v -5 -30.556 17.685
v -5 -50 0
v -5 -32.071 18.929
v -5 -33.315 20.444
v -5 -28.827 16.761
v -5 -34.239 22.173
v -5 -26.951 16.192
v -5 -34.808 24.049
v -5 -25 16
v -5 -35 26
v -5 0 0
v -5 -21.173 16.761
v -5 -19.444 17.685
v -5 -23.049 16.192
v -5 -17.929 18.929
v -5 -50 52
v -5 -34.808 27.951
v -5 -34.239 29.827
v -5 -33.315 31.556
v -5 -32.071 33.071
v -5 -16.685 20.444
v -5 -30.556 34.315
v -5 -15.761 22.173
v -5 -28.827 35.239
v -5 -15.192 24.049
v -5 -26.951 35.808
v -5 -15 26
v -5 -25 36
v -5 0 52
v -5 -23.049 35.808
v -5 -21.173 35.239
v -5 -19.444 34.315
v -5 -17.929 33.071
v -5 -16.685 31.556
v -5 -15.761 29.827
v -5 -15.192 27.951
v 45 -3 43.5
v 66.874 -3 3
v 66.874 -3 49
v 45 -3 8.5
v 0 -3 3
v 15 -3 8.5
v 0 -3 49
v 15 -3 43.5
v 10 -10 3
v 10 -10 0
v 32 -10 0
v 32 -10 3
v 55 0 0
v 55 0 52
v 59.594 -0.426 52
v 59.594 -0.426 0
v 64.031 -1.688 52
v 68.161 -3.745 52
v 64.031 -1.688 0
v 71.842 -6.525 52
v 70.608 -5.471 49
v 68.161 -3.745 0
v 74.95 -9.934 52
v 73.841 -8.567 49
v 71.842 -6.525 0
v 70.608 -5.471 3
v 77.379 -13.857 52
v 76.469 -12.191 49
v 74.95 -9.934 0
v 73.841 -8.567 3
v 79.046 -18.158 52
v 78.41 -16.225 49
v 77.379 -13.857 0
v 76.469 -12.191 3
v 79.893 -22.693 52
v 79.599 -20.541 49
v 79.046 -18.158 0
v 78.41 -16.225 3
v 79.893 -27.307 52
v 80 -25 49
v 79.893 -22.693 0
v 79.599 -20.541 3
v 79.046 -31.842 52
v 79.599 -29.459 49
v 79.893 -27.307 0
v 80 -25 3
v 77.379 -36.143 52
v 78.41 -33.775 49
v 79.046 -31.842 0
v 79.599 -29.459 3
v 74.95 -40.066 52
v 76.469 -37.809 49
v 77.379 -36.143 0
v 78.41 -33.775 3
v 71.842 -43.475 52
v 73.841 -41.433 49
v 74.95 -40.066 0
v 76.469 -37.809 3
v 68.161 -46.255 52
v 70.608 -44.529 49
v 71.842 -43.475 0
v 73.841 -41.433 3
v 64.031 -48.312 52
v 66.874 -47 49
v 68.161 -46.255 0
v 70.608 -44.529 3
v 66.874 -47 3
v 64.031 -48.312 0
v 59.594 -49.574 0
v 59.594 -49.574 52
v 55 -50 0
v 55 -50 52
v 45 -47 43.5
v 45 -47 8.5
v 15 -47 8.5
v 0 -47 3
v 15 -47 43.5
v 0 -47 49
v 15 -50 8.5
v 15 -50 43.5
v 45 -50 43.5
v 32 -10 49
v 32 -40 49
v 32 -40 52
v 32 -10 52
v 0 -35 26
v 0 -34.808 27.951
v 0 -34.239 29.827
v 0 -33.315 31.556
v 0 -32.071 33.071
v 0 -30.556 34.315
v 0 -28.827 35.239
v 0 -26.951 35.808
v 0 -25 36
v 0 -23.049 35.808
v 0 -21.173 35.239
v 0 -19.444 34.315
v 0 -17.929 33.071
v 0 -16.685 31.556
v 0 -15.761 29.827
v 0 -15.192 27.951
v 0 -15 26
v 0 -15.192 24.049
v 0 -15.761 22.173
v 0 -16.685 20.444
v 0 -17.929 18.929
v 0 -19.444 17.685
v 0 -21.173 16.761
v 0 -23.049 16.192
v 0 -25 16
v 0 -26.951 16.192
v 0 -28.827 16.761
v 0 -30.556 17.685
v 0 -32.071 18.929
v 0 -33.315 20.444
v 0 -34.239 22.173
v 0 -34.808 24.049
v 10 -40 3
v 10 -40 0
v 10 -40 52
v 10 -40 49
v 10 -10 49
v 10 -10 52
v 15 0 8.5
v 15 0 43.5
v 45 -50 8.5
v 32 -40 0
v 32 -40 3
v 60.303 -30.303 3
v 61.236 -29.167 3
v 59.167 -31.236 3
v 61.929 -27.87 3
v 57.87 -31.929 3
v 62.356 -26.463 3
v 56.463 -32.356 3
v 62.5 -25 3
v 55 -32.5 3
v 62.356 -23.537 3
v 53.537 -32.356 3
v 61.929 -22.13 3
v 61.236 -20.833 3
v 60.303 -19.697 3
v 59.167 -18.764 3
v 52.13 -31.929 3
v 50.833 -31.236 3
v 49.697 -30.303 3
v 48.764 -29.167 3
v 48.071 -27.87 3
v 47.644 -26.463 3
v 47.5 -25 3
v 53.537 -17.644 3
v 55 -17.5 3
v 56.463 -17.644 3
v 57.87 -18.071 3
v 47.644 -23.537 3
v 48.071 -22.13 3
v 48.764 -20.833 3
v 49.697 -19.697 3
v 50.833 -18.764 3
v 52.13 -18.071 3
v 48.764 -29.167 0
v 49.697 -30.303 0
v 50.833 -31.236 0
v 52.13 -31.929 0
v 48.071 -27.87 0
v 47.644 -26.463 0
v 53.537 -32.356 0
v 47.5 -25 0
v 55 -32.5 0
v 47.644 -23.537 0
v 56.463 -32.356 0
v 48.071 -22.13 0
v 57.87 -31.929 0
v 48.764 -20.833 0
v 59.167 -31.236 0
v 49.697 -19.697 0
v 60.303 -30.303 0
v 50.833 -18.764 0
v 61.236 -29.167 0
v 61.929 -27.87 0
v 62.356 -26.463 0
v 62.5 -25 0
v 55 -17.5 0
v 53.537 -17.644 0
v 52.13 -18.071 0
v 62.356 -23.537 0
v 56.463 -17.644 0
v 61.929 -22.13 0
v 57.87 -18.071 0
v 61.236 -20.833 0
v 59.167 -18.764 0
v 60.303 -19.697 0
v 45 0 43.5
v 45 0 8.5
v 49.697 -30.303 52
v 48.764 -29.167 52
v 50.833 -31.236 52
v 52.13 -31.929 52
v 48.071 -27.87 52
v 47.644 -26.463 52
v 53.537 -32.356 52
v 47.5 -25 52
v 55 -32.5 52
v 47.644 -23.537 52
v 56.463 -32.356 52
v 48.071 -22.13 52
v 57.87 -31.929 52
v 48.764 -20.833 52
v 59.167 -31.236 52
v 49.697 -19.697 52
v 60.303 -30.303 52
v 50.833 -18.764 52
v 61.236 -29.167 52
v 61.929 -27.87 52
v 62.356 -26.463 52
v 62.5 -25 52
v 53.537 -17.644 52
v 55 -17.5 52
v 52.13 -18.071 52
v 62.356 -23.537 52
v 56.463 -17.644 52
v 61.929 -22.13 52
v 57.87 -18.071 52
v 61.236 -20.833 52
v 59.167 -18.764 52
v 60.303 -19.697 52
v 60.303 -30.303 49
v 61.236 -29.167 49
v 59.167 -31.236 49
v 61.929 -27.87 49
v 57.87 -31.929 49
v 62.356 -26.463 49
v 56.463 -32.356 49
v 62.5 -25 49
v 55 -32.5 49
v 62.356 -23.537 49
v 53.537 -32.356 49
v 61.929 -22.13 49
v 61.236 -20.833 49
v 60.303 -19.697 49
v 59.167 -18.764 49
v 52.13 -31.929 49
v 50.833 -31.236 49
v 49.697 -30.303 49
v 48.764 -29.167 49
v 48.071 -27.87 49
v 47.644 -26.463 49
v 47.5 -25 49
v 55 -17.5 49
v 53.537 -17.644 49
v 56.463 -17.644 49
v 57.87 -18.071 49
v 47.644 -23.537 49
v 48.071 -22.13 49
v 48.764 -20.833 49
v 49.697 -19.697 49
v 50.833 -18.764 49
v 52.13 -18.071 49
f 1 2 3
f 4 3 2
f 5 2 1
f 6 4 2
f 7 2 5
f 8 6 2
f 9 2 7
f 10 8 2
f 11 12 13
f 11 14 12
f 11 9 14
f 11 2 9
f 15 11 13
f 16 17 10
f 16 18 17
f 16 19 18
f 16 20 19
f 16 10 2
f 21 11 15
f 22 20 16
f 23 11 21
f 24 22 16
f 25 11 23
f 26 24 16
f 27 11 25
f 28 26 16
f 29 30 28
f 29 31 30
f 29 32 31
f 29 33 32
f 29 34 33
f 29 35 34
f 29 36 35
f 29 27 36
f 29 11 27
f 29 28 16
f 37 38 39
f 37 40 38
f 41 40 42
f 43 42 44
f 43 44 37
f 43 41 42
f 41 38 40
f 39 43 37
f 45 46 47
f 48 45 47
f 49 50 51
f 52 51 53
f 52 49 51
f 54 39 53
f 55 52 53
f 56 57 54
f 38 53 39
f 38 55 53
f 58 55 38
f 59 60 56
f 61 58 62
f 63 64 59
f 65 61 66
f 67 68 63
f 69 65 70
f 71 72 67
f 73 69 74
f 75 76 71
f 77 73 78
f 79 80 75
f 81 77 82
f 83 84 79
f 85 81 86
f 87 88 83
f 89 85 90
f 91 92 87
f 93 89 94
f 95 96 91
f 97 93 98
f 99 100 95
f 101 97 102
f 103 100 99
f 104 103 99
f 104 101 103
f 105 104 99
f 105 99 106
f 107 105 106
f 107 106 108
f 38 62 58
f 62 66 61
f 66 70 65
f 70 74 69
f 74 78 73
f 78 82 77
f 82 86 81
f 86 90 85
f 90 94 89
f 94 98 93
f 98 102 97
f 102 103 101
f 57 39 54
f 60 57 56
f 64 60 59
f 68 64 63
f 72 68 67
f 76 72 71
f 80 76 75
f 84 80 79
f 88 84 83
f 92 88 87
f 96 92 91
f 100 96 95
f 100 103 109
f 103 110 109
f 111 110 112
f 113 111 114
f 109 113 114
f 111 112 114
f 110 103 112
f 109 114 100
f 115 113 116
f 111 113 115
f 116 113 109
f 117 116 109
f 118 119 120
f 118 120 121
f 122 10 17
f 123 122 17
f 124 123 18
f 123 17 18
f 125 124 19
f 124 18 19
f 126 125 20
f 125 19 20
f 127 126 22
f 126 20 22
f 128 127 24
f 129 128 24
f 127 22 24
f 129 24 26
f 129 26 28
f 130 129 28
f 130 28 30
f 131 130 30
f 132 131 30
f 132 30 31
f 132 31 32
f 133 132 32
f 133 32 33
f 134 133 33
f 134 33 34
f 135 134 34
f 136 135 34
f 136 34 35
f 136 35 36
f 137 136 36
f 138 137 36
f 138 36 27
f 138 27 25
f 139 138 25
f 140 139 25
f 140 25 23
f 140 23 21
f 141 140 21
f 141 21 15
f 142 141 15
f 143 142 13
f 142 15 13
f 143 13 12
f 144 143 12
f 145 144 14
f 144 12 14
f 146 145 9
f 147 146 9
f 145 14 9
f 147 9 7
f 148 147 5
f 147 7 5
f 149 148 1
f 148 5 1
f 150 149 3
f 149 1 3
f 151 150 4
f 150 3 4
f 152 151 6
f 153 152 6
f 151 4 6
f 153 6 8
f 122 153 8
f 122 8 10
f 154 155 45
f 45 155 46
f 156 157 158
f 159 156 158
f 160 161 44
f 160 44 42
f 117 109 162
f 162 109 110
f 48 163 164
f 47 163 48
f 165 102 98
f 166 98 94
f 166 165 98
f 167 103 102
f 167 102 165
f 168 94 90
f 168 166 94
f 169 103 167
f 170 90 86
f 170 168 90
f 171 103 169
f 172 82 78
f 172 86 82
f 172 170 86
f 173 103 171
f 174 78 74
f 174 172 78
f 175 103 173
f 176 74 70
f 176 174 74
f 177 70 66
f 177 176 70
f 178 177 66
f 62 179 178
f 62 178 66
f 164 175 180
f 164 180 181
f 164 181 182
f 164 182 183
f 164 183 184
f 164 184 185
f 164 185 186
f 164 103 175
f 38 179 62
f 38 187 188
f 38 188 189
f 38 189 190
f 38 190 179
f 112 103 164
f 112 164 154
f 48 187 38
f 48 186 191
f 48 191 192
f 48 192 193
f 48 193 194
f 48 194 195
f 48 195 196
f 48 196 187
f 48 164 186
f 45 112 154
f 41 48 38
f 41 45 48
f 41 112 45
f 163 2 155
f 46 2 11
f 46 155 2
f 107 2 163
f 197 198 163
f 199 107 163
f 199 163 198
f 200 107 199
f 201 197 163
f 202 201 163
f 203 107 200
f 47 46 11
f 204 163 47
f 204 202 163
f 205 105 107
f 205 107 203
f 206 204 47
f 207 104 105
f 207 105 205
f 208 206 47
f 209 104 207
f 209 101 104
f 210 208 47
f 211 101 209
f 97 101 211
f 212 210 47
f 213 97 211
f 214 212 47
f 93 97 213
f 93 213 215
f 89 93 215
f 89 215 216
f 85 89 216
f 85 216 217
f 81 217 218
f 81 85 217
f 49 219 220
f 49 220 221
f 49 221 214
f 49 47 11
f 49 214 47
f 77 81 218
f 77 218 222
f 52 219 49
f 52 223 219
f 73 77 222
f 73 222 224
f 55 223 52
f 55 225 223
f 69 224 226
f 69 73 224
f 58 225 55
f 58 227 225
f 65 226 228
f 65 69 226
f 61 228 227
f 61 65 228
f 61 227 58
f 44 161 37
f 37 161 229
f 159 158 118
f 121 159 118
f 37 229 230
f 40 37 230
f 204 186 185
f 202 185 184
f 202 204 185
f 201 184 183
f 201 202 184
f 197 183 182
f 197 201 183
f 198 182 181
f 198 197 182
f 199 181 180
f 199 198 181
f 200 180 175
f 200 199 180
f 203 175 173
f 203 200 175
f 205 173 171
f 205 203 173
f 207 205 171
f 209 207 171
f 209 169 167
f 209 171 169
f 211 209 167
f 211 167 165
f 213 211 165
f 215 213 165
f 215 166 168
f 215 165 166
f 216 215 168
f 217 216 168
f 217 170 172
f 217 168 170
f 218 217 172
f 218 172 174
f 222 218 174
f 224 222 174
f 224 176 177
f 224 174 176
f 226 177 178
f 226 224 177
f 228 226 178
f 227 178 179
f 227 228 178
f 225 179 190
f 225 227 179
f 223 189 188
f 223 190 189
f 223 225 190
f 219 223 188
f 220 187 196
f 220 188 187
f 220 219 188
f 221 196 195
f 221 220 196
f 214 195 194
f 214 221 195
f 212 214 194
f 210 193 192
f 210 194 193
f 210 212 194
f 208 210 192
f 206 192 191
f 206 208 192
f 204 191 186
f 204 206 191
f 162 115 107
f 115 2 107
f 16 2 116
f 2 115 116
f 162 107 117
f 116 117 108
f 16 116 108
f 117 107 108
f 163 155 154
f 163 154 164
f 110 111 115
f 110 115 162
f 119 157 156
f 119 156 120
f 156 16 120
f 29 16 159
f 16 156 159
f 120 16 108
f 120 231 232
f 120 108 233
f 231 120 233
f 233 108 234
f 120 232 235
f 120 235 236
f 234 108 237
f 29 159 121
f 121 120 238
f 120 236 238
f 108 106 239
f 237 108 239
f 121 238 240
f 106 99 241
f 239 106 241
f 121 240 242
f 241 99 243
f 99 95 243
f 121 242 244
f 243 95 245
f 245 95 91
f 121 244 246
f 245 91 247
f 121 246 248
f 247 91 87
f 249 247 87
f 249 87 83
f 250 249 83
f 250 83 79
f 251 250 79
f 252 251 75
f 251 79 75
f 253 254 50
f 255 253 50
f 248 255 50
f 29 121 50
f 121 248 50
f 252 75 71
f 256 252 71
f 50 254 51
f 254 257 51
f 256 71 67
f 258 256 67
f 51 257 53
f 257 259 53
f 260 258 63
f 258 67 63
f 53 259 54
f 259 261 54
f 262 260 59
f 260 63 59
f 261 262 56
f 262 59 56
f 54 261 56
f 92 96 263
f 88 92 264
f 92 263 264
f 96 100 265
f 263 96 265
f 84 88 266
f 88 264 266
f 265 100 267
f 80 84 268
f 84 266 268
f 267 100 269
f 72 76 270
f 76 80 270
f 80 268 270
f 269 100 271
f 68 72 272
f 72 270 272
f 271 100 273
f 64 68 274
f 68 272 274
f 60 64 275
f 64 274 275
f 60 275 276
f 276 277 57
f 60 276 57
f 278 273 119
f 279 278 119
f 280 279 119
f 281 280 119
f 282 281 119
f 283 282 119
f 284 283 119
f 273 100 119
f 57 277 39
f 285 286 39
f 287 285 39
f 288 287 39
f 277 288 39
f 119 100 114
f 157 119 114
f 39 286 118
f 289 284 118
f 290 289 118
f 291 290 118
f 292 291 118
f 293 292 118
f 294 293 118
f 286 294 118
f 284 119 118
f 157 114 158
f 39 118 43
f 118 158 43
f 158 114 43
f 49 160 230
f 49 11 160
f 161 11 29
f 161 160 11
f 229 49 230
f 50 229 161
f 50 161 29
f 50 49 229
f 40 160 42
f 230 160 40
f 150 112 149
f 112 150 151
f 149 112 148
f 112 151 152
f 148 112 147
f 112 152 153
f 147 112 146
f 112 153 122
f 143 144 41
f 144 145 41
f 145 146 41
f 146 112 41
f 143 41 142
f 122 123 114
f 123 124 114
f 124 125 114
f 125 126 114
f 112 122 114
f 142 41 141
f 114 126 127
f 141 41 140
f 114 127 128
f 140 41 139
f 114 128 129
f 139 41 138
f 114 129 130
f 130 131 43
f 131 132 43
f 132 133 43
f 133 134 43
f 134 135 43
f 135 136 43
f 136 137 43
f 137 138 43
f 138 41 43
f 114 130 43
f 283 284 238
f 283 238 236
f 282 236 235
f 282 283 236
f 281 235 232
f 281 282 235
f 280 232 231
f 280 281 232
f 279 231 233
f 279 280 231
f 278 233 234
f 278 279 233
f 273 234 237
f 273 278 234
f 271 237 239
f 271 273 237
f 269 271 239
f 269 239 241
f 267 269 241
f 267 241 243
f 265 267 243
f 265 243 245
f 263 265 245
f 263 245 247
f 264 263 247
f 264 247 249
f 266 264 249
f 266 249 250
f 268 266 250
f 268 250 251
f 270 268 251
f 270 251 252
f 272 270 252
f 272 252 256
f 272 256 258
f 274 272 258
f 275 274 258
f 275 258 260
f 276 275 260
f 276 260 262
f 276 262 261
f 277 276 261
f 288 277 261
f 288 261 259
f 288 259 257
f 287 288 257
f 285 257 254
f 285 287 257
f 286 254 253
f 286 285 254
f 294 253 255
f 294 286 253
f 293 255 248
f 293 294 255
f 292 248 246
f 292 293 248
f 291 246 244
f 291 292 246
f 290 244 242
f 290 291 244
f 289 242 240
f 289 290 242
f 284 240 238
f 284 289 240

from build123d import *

# Parameters (mm, degrees)
SKETCH_1_R          = 7.5
SKETCH_1_W          = 22
SKETCH_1_H          = 30
EXTRUDE_1_DEPTH     = 52
SKETCH_2_W          = 30
SKETCH_2_H          = 35
CUT_EXTRUDE_1_DEPTH = 108.721864076
SKETCH_3_W          = 46
SKETCH_3_H          = 44
CUT_EXTRUDE_2_DEPTH = 108.721864076
SKETCH_4_W          = 52
SKETCH_4_H          = 50
EXTRUDE_2_DEPTH     = 5
SKETCH_5_R          = 10
CUT_EXTRUDE_3_DEPTH = 112.485425056


with BuildPart() as part:
    # ｽｹｯﾁ1 → ﾎﾞｽ - 押し出し1 (new body)
    with BuildSketch(Plane.XY):
        with BuildLine():
            Line((0, 0), (55, 0))
            ThreePointArc((55, 0), (80, -25), (55, -50))
            Line((55, -50), (0, -50))
            Line((0, -50), (0, 0))
        make_face()
        with Locations(Location((55, -25, 0), (0, 0, 180))):
            Circle(SKETCH_1_R, mode=Mode.SUBTRACT)
        with Locations((21, -25)):
            Rectangle(SKETCH_1_W, SKETCH_1_H, mode=Mode.SUBTRACT)
    extrude(amount=EXTRUDE_1_DEPTH)

    # ｽｹｯﾁ2 → ｶｯﾄ - 押し出し1 (cut, through all)
    with BuildSketch(Plane(origin=(0, 0, 0), x_dir=(1, 0, 0), z_dir=(0, 1, 0))):
        with Locations((30, -26)):
            Rectangle(SKETCH_2_W, SKETCH_2_H)
    extrude(amount=-CUT_EXTRUDE_1_DEPTH, mode=Mode.SUBTRACT)

    # ｽｹｯﾁ3 → ｶｯﾄ - 押し出し2 (cut, through all)
    with BuildSketch(Plane.ZY):
        with Locations((26, -25)):
            Rectangle(SKETCH_3_W, SKETCH_3_H)
    extrude(amount=-CUT_EXTRUDE_2_DEPTH, mode=Mode.SUBTRACT)

    # ｽｹｯﾁ4 → ﾎﾞｽ - 押し出し2 (add)
    with BuildSketch(Plane.ZY):
        with Locations((26, -25)):
            Rectangle(SKETCH_4_W, SKETCH_4_H)
    extrude(amount=EXTRUDE_2_DEPTH)

    # ｽｹｯﾁ5 → ｶｯﾄ - 押し出し3 (cut, through all)
    with BuildSketch(Plane.ZY.offset(5)):
        with Locations(Location((26, -25, 0), (0, 0, 270))):
            Circle(SKETCH_5_R)
    extrude(amount=-CUT_EXTRUDE_3_DEPTH, mode=Mode.SUBTRACT)


solid = part.part
